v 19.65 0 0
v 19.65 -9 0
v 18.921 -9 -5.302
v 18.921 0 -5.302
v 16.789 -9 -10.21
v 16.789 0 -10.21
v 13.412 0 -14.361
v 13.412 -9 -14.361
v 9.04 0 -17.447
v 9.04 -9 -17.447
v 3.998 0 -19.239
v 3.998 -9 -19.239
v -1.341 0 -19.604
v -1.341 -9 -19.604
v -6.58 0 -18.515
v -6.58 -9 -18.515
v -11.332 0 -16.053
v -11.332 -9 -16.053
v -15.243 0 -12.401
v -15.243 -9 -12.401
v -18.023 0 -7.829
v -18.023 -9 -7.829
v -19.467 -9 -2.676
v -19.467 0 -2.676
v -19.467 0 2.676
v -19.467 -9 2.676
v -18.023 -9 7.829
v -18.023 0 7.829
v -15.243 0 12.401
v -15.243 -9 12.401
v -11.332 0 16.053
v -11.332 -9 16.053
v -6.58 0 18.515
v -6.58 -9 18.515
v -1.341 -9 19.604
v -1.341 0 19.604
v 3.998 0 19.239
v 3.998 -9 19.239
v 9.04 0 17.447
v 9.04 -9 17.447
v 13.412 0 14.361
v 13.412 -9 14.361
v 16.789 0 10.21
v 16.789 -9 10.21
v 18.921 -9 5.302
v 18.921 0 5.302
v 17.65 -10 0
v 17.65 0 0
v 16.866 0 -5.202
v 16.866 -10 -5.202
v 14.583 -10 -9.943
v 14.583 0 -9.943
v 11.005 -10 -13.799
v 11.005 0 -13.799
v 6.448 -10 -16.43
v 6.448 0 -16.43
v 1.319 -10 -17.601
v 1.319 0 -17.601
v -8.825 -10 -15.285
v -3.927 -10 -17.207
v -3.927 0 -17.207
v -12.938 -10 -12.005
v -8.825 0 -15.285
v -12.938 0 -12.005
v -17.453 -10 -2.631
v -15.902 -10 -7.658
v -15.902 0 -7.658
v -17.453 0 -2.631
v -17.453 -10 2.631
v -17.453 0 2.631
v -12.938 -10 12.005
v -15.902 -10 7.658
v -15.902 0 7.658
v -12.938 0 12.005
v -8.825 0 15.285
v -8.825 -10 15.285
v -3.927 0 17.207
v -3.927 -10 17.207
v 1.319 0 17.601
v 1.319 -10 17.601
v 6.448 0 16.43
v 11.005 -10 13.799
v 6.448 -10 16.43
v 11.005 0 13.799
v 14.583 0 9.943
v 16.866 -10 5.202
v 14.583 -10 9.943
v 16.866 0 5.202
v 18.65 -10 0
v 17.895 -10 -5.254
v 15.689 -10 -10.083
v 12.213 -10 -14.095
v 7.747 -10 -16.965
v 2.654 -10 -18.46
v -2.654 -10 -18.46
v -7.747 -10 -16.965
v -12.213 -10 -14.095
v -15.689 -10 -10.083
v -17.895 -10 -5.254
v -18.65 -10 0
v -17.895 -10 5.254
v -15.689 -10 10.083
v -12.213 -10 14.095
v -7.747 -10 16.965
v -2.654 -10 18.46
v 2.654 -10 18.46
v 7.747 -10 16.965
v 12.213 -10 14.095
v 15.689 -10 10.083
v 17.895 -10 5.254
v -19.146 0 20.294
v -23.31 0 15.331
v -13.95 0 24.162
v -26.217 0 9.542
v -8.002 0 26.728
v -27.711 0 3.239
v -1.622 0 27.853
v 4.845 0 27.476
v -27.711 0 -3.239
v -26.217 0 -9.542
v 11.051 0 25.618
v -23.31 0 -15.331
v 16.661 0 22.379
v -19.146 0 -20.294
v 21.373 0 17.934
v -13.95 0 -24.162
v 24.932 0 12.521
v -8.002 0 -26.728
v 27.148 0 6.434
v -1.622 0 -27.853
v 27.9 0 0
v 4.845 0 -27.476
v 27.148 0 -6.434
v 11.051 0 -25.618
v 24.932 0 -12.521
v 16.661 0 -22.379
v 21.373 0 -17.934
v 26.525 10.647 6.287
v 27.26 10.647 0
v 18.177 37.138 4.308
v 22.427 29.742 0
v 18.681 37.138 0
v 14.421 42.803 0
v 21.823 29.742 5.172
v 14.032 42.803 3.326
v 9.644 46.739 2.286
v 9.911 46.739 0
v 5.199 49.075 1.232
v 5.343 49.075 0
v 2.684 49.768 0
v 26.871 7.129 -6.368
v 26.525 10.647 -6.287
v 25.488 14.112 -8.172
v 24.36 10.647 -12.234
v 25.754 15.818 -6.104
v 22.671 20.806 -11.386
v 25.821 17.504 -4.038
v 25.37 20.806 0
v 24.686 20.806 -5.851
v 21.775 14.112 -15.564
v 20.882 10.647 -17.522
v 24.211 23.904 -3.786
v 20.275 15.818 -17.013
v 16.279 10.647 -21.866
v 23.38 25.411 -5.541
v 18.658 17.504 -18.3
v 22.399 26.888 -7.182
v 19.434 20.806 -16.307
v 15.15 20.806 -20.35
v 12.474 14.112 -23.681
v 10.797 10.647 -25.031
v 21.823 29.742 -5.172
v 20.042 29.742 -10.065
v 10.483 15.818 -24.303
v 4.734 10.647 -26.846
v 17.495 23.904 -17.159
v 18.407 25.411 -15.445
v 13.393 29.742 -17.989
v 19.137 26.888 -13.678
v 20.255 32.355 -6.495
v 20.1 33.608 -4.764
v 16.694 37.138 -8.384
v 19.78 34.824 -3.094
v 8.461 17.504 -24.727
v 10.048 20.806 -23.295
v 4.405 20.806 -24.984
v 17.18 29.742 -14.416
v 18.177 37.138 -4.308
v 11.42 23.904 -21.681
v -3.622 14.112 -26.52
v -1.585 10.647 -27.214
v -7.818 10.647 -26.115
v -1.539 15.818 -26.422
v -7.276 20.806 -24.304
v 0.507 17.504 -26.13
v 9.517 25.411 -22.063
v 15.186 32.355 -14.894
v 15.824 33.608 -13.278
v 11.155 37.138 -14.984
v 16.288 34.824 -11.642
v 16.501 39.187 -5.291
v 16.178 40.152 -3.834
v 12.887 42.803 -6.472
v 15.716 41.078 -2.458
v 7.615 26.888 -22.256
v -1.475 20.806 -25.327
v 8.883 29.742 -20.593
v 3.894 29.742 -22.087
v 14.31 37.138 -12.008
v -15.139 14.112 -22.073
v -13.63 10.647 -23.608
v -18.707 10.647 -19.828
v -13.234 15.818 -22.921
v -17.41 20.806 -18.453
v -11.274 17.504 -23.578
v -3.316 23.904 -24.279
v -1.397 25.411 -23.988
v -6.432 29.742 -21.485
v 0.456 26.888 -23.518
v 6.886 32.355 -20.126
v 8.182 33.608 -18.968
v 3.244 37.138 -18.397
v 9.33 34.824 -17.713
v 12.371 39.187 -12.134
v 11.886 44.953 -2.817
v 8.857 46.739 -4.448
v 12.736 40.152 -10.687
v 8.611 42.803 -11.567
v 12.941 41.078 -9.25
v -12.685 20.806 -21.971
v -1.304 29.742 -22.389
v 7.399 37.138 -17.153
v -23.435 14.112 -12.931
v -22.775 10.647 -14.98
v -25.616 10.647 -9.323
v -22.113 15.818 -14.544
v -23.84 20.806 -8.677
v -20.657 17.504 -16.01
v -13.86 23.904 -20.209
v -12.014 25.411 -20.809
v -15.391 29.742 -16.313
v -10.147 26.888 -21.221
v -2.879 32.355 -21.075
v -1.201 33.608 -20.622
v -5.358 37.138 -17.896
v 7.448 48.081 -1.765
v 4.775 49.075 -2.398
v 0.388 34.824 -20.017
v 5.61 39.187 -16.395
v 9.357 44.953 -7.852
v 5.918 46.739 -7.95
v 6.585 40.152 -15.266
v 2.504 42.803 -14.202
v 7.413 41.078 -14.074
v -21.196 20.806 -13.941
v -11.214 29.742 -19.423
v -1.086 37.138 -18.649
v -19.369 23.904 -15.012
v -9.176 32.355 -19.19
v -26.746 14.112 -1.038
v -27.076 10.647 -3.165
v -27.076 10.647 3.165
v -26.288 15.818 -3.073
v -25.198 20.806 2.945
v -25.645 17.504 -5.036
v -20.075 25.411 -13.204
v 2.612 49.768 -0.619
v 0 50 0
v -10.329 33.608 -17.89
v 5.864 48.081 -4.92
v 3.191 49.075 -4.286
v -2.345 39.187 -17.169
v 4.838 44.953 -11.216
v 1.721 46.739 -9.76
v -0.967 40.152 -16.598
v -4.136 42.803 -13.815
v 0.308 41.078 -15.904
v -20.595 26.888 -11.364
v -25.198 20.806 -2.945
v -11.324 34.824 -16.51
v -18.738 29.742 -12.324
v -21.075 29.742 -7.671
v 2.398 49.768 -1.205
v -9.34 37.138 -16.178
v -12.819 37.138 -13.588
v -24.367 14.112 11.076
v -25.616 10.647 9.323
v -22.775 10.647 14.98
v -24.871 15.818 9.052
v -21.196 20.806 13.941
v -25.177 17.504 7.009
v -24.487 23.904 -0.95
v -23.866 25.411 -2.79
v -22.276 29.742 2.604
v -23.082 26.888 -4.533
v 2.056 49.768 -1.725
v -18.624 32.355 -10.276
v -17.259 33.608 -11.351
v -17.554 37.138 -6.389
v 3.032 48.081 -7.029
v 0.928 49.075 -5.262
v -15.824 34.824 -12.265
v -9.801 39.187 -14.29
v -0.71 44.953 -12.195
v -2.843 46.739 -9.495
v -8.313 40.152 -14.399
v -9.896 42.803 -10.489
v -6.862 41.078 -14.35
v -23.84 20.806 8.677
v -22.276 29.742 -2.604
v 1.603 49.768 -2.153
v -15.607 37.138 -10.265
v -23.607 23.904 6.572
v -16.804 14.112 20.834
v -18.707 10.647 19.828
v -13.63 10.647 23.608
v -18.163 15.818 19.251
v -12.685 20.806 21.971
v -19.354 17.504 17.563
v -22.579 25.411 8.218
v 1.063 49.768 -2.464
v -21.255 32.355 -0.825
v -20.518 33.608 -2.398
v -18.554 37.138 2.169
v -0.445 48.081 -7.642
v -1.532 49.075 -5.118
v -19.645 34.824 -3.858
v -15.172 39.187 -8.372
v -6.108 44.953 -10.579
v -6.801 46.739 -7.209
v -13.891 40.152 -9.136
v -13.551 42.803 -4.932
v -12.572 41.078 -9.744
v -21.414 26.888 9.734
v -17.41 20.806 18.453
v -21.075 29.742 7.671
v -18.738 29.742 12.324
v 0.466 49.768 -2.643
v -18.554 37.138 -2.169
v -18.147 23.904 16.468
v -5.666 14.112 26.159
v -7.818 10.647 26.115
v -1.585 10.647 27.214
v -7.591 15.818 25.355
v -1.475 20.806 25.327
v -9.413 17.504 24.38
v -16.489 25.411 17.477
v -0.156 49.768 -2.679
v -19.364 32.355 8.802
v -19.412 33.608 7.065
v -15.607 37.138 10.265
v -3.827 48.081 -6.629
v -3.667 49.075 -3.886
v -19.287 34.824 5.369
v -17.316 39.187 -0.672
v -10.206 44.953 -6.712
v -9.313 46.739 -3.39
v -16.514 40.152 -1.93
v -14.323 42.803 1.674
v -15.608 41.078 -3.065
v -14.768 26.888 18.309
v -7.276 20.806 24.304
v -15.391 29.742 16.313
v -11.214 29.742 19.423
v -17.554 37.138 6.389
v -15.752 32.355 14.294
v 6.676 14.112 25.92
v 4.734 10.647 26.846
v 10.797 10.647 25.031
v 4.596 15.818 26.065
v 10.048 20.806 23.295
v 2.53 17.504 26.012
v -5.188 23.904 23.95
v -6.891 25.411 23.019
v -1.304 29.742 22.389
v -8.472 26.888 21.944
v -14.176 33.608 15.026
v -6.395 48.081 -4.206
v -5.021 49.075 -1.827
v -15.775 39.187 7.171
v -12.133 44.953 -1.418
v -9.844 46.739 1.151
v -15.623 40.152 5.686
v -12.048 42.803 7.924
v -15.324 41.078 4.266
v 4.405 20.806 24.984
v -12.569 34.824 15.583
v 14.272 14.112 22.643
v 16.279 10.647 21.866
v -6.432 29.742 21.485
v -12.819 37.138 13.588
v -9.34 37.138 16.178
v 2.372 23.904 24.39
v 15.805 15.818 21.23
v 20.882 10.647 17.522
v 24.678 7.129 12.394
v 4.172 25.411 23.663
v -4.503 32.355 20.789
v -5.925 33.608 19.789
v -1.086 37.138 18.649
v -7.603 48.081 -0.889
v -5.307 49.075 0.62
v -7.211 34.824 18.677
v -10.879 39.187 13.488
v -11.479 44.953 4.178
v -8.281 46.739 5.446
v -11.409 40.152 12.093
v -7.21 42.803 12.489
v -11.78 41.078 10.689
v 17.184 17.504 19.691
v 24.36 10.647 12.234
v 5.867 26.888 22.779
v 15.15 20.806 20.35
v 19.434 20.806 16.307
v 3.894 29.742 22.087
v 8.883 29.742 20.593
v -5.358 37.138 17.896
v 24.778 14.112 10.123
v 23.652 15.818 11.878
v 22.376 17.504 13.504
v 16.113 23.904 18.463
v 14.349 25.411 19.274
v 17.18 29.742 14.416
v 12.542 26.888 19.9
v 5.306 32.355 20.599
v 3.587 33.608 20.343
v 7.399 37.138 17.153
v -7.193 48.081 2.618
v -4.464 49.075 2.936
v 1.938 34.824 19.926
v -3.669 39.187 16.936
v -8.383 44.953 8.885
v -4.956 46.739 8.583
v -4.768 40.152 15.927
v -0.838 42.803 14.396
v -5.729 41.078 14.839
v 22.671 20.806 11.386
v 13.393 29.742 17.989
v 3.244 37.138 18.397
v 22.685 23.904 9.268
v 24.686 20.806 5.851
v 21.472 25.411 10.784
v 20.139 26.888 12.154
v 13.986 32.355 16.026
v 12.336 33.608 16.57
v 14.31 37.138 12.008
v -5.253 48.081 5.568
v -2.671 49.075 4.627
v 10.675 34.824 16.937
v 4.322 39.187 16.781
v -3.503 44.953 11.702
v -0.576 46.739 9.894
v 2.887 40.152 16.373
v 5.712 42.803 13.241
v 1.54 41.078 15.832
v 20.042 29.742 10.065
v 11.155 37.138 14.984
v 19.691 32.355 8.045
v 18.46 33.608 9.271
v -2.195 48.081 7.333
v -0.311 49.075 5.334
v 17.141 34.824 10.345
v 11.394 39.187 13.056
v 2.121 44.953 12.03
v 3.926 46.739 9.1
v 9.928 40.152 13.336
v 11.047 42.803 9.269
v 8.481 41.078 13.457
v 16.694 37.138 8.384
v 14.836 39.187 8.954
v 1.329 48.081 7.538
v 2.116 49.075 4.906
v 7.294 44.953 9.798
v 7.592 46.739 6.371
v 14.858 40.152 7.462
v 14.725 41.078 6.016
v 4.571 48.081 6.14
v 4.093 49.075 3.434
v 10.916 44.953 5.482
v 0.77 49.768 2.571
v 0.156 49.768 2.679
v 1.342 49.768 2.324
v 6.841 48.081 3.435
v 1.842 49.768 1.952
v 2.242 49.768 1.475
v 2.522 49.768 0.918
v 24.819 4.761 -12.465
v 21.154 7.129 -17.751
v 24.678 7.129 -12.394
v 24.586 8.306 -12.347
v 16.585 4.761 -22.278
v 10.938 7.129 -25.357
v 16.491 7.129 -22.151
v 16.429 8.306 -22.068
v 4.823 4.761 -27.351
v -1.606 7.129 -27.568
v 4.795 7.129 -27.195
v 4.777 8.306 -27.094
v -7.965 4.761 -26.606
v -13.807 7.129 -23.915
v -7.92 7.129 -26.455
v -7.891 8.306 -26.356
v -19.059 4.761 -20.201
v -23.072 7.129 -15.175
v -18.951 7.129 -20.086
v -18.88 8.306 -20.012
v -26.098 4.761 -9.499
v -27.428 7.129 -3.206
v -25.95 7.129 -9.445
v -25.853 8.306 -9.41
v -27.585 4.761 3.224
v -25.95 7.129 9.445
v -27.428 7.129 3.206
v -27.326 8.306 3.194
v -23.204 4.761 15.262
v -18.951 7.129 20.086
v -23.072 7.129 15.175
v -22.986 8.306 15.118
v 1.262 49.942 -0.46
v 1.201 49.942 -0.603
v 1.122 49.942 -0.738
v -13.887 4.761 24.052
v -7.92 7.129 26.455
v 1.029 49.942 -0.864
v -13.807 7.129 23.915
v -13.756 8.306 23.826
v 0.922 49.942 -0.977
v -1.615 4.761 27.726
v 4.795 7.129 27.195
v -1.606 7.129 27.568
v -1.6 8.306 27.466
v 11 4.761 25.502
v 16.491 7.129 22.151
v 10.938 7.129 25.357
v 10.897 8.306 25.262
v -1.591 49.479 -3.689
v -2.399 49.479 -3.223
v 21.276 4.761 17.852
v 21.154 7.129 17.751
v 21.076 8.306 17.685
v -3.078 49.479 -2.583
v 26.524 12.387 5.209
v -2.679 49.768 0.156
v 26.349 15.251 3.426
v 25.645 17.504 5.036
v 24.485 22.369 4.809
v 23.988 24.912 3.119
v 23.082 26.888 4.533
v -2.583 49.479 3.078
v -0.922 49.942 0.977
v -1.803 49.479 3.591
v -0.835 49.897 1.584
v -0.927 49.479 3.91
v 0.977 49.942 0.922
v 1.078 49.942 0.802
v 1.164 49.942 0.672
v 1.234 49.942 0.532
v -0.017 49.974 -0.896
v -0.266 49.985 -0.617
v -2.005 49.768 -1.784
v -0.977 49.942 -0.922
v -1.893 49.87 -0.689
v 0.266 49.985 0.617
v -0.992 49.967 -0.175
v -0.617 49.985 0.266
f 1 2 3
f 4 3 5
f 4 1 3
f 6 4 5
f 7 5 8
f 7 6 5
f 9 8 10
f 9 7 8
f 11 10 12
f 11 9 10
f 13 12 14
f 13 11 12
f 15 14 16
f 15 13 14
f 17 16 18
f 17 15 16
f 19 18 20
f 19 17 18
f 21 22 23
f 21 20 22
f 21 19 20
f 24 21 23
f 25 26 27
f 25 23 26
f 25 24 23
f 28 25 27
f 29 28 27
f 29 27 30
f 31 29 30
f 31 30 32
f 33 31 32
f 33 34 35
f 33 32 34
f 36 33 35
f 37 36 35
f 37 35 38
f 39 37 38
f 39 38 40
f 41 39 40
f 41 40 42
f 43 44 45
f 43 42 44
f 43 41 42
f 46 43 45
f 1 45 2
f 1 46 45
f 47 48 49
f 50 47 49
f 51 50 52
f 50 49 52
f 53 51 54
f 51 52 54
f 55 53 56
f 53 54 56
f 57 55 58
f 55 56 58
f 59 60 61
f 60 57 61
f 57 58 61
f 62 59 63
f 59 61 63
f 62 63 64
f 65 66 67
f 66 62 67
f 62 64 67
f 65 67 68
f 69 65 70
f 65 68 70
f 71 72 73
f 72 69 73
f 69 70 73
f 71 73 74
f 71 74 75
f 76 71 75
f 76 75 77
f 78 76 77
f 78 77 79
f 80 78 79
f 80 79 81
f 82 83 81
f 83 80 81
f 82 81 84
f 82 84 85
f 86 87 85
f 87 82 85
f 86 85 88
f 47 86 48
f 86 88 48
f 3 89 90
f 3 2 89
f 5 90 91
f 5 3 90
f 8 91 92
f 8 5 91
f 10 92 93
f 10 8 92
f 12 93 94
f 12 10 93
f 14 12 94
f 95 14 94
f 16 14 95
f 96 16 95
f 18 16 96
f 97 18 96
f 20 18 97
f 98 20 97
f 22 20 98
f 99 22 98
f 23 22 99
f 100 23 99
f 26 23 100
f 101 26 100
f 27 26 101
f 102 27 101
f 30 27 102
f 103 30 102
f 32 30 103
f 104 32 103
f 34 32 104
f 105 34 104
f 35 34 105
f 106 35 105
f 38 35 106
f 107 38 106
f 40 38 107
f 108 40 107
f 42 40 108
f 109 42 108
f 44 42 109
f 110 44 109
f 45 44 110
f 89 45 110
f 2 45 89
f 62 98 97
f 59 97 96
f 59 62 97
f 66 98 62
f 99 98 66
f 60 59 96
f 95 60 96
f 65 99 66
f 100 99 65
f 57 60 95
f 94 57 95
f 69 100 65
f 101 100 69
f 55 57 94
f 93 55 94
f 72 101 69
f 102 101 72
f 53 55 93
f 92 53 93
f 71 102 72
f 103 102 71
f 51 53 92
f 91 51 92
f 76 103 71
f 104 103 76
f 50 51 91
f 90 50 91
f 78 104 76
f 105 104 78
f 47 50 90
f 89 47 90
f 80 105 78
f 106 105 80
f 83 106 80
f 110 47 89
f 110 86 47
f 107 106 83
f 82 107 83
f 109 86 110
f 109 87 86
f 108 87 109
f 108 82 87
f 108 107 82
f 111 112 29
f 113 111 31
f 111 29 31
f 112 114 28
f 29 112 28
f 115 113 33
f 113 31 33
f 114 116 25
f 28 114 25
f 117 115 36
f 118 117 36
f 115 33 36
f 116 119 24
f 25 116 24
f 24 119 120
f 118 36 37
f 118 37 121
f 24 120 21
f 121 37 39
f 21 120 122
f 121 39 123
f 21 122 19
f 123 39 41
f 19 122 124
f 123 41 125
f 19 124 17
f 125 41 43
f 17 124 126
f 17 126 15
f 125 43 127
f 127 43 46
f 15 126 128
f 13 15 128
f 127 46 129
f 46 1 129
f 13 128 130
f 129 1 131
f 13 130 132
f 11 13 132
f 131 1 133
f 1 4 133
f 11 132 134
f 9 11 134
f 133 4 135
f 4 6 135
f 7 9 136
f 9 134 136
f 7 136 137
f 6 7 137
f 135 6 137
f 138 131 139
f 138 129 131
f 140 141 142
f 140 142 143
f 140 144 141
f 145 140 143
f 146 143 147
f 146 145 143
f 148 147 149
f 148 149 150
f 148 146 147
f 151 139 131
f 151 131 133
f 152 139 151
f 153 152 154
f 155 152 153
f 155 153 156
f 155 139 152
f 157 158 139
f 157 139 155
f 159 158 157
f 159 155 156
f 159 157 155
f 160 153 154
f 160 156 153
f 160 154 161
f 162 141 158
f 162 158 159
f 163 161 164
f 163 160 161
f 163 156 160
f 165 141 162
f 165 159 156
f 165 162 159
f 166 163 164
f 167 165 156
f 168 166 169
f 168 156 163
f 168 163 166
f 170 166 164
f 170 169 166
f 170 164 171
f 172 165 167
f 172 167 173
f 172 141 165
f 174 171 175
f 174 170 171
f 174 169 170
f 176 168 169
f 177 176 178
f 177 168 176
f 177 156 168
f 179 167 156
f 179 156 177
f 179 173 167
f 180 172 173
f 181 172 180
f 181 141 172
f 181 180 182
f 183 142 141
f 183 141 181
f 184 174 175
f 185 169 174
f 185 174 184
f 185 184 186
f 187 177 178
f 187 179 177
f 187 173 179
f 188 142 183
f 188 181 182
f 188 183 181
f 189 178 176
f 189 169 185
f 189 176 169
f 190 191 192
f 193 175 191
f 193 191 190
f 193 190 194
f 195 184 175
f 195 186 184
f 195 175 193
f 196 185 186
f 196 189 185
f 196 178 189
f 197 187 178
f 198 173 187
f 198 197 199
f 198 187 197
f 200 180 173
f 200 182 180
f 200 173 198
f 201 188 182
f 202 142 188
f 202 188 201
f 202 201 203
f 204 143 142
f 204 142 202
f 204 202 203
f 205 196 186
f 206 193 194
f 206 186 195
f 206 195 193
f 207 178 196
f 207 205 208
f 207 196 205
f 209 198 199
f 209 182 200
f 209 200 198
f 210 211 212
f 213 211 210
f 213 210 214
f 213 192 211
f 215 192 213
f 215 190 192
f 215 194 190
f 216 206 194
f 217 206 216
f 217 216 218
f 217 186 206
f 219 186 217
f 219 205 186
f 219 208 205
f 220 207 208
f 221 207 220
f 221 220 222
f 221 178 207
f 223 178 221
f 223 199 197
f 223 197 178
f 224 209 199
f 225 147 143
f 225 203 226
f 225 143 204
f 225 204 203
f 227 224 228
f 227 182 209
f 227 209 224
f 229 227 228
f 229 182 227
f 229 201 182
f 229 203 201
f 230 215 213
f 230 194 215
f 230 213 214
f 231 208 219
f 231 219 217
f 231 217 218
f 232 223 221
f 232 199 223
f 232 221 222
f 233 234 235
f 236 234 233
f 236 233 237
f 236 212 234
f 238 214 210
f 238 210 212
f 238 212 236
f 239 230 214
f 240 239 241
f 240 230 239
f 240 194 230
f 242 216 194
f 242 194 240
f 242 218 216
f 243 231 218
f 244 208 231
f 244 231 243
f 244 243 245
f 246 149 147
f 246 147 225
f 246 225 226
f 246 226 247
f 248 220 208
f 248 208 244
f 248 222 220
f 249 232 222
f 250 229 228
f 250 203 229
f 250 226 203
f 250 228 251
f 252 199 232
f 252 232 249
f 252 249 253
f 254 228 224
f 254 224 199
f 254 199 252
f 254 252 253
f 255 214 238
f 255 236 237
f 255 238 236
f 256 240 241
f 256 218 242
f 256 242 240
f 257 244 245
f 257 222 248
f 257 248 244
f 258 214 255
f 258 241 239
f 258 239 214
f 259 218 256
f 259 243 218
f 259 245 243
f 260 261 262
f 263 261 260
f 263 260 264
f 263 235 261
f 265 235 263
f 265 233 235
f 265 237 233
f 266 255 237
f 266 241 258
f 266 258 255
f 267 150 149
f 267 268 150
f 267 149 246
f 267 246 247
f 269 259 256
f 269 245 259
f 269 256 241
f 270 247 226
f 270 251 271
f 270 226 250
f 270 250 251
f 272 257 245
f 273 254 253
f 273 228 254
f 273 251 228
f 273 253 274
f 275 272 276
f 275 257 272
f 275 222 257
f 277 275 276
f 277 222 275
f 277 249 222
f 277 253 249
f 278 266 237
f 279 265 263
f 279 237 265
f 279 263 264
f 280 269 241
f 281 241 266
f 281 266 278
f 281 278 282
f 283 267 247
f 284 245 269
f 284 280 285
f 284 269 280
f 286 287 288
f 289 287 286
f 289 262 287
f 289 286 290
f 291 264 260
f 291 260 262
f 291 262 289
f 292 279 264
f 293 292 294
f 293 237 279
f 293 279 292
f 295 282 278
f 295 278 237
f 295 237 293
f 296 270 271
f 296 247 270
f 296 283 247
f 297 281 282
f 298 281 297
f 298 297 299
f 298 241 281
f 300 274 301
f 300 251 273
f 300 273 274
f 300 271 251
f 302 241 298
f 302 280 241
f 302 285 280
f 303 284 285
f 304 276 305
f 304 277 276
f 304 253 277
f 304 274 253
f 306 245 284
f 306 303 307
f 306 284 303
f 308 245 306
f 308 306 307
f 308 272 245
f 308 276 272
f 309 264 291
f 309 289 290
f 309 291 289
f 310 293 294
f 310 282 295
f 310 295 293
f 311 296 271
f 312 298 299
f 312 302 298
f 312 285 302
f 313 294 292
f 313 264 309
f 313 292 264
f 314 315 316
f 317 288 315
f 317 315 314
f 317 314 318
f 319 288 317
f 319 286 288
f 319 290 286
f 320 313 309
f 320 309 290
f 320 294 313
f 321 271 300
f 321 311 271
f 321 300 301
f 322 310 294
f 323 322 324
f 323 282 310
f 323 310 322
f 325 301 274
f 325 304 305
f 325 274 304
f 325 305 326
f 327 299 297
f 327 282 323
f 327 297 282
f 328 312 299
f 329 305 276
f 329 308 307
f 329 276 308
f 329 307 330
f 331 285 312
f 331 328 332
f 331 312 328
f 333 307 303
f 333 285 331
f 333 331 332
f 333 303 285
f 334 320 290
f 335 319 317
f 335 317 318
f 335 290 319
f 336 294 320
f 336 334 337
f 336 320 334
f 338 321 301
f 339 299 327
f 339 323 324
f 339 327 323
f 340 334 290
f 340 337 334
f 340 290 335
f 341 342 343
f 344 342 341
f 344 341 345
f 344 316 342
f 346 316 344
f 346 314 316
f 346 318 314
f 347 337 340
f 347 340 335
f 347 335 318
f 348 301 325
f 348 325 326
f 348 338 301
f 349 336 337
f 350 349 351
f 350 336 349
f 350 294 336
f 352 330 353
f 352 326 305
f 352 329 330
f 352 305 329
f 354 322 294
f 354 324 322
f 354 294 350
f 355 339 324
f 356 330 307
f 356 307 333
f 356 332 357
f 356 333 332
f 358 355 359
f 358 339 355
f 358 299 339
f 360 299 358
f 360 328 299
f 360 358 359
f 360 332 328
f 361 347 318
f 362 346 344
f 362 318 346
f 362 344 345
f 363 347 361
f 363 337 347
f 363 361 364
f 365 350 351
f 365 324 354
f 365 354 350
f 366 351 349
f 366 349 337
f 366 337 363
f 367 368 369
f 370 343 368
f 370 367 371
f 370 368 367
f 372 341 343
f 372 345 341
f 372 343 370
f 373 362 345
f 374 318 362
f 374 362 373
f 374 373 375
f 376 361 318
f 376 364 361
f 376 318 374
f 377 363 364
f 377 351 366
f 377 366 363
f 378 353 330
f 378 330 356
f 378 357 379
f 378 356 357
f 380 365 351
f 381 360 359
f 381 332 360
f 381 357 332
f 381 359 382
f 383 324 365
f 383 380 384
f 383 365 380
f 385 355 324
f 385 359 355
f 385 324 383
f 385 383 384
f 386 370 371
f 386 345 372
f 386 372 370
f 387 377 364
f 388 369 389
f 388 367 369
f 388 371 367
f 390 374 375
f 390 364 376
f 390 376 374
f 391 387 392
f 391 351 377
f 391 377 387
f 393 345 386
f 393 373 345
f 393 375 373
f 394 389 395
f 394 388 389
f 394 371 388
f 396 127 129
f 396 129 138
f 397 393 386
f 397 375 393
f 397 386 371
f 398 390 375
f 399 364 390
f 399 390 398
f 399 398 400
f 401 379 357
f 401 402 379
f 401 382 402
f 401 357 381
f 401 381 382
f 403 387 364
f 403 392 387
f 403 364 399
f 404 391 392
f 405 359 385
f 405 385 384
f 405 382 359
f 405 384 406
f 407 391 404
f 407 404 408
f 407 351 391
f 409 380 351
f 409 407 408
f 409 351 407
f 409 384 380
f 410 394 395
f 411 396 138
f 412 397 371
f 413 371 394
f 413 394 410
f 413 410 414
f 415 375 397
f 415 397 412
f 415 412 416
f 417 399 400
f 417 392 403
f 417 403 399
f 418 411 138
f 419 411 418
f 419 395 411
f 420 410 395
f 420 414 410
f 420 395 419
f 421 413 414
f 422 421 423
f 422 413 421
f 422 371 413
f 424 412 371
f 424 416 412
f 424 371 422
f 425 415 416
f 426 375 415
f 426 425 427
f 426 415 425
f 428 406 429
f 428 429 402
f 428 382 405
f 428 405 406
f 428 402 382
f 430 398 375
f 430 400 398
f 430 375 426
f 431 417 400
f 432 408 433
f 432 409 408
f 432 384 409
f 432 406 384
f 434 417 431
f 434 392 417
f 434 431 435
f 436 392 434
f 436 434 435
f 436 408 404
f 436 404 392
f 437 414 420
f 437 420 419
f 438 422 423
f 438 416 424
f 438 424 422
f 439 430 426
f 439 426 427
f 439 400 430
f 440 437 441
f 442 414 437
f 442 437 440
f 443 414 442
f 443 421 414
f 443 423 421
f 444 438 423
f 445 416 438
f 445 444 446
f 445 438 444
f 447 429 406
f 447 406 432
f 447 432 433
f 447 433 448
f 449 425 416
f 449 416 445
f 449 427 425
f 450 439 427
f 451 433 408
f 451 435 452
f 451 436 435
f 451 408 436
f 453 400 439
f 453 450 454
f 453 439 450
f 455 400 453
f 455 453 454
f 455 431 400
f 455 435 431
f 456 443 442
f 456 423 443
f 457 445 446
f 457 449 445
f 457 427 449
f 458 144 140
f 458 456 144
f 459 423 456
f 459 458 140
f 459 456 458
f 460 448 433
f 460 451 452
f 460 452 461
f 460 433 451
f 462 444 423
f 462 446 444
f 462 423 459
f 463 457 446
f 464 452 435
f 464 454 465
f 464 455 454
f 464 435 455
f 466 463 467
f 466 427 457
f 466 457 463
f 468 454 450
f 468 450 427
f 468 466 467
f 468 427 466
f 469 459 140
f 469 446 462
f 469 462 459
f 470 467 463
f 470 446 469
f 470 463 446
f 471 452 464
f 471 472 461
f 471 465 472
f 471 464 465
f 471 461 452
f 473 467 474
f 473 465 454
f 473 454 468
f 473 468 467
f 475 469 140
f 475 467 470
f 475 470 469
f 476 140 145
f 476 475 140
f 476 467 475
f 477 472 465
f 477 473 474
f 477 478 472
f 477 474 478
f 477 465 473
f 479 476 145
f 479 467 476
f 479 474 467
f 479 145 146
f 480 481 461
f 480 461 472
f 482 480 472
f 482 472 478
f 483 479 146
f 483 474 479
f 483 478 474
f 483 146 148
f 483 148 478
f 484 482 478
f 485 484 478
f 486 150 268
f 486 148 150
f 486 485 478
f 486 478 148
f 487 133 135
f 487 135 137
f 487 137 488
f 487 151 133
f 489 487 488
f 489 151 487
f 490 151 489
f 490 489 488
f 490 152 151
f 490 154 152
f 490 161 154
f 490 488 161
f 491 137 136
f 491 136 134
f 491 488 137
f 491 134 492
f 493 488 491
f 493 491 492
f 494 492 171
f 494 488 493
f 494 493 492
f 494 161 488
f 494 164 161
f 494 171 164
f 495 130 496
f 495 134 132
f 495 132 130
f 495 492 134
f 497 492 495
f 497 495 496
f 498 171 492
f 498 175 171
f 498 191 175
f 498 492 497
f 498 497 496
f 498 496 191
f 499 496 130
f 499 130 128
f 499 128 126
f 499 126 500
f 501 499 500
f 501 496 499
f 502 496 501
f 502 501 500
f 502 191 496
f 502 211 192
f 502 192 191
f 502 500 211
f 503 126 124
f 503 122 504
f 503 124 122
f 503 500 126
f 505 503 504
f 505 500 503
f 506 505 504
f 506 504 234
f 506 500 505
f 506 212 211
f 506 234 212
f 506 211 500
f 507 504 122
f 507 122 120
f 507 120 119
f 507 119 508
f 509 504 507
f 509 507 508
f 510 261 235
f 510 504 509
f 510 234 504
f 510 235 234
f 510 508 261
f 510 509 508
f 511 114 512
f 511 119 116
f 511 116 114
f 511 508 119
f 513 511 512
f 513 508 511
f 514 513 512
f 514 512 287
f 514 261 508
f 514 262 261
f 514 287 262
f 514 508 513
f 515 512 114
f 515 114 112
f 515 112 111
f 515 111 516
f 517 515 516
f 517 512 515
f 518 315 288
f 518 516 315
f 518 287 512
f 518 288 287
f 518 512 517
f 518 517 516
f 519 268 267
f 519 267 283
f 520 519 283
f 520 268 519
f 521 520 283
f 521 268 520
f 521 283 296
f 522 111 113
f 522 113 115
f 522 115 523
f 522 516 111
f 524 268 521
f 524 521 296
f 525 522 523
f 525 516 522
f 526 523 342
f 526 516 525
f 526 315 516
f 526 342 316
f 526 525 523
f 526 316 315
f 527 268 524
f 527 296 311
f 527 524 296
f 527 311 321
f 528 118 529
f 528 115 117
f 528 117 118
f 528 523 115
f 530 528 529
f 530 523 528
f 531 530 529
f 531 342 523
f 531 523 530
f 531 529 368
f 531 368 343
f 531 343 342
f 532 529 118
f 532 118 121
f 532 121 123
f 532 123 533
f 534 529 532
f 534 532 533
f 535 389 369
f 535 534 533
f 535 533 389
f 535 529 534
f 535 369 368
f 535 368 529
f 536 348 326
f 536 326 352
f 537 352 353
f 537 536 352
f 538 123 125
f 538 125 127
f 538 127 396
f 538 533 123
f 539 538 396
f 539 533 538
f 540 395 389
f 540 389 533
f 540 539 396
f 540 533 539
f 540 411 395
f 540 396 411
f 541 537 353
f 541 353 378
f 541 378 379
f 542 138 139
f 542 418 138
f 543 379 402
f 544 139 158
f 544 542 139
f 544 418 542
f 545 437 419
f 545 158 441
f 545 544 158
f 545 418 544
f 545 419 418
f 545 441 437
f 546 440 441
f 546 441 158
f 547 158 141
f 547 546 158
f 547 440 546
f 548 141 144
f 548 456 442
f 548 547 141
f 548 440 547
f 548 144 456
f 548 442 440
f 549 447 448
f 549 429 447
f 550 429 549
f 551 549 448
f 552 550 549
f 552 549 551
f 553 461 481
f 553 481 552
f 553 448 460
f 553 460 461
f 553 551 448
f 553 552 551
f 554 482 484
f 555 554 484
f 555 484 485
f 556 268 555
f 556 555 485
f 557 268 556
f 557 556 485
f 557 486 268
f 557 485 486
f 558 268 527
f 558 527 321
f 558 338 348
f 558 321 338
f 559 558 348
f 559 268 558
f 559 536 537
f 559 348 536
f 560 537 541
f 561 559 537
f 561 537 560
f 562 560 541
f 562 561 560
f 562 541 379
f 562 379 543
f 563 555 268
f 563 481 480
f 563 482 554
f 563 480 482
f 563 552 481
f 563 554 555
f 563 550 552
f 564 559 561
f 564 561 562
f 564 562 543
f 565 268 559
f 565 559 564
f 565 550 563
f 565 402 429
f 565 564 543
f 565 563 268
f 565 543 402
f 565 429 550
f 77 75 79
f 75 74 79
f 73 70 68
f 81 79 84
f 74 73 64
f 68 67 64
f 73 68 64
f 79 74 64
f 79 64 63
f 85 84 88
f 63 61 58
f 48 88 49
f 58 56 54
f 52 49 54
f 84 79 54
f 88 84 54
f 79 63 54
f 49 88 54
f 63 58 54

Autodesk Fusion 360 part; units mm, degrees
sketch "Sketch1" plane through (0, 0, 0) normal (0, 0, 1) x (1, 0, 0)
  ellipse E0 centre (0, 0) end of major axis (0, 50) minor radius 27.9
  line L0 (0, -50) -> (0, 50)
  line L1 (27.9, 0) -> (-27.9, 0)
  line L2 (27.9, 0) -> (-27.9, 0)
  line L3 (0, -50) -> (0, 50)
  dimension "d1" = 100
  dimension "d2" = 55.8
revolve "Revolve1" add sketch "Sketch1" angle 360 about axis through (0, -50, 0) along (0, 1, 0) contours E0 L0 L1 L2 L3 picked at (5.5014, 30.1044)
sketch "Sketch2" plane through (0, 0, 0) normal (0, -1, 0) x (1, 0, 0)
  circle A0 centre (0, 0) radius 27.9
  circle A1 centre (0, 0) radius 27.9
  circle A2 centre (0, 0) radius 27.15 construction
  circle A3 centre (0, 0) radius 20.65 construction
  circle A4 centre (0, 0) radius 19.65
  circle A5 centre (0, 0) radius 17.65
  dimension "d19" = 41.3
  dimension "d21" = -3
extrude "Extrude2" add sketch "Sketch2" along normal blind 10 contours A4
sketch "Sketch3" plane through (0, 0, 0) normal (0, -1, 0) x (1, 0, 0)
  circle A0 centre (0, 0) radius 17.65
shell "Shell3" thickness 1 removed faces 1 at (1.7237, 0, -3.6114)
chamfer "Chamfer2" distance 1 angle 45 1 edges at (-18.3202, -10, -7.1057)
equation "d2 = 2 in + 5 mm"
equation "cardboard_offset = 0.75 mm"
equation "fit_offset = 1 mm"
equation "d19 = ( 20.65 * 2 ) * 1 mm"
equation "d21 = -fit_offset - 2 mm"
